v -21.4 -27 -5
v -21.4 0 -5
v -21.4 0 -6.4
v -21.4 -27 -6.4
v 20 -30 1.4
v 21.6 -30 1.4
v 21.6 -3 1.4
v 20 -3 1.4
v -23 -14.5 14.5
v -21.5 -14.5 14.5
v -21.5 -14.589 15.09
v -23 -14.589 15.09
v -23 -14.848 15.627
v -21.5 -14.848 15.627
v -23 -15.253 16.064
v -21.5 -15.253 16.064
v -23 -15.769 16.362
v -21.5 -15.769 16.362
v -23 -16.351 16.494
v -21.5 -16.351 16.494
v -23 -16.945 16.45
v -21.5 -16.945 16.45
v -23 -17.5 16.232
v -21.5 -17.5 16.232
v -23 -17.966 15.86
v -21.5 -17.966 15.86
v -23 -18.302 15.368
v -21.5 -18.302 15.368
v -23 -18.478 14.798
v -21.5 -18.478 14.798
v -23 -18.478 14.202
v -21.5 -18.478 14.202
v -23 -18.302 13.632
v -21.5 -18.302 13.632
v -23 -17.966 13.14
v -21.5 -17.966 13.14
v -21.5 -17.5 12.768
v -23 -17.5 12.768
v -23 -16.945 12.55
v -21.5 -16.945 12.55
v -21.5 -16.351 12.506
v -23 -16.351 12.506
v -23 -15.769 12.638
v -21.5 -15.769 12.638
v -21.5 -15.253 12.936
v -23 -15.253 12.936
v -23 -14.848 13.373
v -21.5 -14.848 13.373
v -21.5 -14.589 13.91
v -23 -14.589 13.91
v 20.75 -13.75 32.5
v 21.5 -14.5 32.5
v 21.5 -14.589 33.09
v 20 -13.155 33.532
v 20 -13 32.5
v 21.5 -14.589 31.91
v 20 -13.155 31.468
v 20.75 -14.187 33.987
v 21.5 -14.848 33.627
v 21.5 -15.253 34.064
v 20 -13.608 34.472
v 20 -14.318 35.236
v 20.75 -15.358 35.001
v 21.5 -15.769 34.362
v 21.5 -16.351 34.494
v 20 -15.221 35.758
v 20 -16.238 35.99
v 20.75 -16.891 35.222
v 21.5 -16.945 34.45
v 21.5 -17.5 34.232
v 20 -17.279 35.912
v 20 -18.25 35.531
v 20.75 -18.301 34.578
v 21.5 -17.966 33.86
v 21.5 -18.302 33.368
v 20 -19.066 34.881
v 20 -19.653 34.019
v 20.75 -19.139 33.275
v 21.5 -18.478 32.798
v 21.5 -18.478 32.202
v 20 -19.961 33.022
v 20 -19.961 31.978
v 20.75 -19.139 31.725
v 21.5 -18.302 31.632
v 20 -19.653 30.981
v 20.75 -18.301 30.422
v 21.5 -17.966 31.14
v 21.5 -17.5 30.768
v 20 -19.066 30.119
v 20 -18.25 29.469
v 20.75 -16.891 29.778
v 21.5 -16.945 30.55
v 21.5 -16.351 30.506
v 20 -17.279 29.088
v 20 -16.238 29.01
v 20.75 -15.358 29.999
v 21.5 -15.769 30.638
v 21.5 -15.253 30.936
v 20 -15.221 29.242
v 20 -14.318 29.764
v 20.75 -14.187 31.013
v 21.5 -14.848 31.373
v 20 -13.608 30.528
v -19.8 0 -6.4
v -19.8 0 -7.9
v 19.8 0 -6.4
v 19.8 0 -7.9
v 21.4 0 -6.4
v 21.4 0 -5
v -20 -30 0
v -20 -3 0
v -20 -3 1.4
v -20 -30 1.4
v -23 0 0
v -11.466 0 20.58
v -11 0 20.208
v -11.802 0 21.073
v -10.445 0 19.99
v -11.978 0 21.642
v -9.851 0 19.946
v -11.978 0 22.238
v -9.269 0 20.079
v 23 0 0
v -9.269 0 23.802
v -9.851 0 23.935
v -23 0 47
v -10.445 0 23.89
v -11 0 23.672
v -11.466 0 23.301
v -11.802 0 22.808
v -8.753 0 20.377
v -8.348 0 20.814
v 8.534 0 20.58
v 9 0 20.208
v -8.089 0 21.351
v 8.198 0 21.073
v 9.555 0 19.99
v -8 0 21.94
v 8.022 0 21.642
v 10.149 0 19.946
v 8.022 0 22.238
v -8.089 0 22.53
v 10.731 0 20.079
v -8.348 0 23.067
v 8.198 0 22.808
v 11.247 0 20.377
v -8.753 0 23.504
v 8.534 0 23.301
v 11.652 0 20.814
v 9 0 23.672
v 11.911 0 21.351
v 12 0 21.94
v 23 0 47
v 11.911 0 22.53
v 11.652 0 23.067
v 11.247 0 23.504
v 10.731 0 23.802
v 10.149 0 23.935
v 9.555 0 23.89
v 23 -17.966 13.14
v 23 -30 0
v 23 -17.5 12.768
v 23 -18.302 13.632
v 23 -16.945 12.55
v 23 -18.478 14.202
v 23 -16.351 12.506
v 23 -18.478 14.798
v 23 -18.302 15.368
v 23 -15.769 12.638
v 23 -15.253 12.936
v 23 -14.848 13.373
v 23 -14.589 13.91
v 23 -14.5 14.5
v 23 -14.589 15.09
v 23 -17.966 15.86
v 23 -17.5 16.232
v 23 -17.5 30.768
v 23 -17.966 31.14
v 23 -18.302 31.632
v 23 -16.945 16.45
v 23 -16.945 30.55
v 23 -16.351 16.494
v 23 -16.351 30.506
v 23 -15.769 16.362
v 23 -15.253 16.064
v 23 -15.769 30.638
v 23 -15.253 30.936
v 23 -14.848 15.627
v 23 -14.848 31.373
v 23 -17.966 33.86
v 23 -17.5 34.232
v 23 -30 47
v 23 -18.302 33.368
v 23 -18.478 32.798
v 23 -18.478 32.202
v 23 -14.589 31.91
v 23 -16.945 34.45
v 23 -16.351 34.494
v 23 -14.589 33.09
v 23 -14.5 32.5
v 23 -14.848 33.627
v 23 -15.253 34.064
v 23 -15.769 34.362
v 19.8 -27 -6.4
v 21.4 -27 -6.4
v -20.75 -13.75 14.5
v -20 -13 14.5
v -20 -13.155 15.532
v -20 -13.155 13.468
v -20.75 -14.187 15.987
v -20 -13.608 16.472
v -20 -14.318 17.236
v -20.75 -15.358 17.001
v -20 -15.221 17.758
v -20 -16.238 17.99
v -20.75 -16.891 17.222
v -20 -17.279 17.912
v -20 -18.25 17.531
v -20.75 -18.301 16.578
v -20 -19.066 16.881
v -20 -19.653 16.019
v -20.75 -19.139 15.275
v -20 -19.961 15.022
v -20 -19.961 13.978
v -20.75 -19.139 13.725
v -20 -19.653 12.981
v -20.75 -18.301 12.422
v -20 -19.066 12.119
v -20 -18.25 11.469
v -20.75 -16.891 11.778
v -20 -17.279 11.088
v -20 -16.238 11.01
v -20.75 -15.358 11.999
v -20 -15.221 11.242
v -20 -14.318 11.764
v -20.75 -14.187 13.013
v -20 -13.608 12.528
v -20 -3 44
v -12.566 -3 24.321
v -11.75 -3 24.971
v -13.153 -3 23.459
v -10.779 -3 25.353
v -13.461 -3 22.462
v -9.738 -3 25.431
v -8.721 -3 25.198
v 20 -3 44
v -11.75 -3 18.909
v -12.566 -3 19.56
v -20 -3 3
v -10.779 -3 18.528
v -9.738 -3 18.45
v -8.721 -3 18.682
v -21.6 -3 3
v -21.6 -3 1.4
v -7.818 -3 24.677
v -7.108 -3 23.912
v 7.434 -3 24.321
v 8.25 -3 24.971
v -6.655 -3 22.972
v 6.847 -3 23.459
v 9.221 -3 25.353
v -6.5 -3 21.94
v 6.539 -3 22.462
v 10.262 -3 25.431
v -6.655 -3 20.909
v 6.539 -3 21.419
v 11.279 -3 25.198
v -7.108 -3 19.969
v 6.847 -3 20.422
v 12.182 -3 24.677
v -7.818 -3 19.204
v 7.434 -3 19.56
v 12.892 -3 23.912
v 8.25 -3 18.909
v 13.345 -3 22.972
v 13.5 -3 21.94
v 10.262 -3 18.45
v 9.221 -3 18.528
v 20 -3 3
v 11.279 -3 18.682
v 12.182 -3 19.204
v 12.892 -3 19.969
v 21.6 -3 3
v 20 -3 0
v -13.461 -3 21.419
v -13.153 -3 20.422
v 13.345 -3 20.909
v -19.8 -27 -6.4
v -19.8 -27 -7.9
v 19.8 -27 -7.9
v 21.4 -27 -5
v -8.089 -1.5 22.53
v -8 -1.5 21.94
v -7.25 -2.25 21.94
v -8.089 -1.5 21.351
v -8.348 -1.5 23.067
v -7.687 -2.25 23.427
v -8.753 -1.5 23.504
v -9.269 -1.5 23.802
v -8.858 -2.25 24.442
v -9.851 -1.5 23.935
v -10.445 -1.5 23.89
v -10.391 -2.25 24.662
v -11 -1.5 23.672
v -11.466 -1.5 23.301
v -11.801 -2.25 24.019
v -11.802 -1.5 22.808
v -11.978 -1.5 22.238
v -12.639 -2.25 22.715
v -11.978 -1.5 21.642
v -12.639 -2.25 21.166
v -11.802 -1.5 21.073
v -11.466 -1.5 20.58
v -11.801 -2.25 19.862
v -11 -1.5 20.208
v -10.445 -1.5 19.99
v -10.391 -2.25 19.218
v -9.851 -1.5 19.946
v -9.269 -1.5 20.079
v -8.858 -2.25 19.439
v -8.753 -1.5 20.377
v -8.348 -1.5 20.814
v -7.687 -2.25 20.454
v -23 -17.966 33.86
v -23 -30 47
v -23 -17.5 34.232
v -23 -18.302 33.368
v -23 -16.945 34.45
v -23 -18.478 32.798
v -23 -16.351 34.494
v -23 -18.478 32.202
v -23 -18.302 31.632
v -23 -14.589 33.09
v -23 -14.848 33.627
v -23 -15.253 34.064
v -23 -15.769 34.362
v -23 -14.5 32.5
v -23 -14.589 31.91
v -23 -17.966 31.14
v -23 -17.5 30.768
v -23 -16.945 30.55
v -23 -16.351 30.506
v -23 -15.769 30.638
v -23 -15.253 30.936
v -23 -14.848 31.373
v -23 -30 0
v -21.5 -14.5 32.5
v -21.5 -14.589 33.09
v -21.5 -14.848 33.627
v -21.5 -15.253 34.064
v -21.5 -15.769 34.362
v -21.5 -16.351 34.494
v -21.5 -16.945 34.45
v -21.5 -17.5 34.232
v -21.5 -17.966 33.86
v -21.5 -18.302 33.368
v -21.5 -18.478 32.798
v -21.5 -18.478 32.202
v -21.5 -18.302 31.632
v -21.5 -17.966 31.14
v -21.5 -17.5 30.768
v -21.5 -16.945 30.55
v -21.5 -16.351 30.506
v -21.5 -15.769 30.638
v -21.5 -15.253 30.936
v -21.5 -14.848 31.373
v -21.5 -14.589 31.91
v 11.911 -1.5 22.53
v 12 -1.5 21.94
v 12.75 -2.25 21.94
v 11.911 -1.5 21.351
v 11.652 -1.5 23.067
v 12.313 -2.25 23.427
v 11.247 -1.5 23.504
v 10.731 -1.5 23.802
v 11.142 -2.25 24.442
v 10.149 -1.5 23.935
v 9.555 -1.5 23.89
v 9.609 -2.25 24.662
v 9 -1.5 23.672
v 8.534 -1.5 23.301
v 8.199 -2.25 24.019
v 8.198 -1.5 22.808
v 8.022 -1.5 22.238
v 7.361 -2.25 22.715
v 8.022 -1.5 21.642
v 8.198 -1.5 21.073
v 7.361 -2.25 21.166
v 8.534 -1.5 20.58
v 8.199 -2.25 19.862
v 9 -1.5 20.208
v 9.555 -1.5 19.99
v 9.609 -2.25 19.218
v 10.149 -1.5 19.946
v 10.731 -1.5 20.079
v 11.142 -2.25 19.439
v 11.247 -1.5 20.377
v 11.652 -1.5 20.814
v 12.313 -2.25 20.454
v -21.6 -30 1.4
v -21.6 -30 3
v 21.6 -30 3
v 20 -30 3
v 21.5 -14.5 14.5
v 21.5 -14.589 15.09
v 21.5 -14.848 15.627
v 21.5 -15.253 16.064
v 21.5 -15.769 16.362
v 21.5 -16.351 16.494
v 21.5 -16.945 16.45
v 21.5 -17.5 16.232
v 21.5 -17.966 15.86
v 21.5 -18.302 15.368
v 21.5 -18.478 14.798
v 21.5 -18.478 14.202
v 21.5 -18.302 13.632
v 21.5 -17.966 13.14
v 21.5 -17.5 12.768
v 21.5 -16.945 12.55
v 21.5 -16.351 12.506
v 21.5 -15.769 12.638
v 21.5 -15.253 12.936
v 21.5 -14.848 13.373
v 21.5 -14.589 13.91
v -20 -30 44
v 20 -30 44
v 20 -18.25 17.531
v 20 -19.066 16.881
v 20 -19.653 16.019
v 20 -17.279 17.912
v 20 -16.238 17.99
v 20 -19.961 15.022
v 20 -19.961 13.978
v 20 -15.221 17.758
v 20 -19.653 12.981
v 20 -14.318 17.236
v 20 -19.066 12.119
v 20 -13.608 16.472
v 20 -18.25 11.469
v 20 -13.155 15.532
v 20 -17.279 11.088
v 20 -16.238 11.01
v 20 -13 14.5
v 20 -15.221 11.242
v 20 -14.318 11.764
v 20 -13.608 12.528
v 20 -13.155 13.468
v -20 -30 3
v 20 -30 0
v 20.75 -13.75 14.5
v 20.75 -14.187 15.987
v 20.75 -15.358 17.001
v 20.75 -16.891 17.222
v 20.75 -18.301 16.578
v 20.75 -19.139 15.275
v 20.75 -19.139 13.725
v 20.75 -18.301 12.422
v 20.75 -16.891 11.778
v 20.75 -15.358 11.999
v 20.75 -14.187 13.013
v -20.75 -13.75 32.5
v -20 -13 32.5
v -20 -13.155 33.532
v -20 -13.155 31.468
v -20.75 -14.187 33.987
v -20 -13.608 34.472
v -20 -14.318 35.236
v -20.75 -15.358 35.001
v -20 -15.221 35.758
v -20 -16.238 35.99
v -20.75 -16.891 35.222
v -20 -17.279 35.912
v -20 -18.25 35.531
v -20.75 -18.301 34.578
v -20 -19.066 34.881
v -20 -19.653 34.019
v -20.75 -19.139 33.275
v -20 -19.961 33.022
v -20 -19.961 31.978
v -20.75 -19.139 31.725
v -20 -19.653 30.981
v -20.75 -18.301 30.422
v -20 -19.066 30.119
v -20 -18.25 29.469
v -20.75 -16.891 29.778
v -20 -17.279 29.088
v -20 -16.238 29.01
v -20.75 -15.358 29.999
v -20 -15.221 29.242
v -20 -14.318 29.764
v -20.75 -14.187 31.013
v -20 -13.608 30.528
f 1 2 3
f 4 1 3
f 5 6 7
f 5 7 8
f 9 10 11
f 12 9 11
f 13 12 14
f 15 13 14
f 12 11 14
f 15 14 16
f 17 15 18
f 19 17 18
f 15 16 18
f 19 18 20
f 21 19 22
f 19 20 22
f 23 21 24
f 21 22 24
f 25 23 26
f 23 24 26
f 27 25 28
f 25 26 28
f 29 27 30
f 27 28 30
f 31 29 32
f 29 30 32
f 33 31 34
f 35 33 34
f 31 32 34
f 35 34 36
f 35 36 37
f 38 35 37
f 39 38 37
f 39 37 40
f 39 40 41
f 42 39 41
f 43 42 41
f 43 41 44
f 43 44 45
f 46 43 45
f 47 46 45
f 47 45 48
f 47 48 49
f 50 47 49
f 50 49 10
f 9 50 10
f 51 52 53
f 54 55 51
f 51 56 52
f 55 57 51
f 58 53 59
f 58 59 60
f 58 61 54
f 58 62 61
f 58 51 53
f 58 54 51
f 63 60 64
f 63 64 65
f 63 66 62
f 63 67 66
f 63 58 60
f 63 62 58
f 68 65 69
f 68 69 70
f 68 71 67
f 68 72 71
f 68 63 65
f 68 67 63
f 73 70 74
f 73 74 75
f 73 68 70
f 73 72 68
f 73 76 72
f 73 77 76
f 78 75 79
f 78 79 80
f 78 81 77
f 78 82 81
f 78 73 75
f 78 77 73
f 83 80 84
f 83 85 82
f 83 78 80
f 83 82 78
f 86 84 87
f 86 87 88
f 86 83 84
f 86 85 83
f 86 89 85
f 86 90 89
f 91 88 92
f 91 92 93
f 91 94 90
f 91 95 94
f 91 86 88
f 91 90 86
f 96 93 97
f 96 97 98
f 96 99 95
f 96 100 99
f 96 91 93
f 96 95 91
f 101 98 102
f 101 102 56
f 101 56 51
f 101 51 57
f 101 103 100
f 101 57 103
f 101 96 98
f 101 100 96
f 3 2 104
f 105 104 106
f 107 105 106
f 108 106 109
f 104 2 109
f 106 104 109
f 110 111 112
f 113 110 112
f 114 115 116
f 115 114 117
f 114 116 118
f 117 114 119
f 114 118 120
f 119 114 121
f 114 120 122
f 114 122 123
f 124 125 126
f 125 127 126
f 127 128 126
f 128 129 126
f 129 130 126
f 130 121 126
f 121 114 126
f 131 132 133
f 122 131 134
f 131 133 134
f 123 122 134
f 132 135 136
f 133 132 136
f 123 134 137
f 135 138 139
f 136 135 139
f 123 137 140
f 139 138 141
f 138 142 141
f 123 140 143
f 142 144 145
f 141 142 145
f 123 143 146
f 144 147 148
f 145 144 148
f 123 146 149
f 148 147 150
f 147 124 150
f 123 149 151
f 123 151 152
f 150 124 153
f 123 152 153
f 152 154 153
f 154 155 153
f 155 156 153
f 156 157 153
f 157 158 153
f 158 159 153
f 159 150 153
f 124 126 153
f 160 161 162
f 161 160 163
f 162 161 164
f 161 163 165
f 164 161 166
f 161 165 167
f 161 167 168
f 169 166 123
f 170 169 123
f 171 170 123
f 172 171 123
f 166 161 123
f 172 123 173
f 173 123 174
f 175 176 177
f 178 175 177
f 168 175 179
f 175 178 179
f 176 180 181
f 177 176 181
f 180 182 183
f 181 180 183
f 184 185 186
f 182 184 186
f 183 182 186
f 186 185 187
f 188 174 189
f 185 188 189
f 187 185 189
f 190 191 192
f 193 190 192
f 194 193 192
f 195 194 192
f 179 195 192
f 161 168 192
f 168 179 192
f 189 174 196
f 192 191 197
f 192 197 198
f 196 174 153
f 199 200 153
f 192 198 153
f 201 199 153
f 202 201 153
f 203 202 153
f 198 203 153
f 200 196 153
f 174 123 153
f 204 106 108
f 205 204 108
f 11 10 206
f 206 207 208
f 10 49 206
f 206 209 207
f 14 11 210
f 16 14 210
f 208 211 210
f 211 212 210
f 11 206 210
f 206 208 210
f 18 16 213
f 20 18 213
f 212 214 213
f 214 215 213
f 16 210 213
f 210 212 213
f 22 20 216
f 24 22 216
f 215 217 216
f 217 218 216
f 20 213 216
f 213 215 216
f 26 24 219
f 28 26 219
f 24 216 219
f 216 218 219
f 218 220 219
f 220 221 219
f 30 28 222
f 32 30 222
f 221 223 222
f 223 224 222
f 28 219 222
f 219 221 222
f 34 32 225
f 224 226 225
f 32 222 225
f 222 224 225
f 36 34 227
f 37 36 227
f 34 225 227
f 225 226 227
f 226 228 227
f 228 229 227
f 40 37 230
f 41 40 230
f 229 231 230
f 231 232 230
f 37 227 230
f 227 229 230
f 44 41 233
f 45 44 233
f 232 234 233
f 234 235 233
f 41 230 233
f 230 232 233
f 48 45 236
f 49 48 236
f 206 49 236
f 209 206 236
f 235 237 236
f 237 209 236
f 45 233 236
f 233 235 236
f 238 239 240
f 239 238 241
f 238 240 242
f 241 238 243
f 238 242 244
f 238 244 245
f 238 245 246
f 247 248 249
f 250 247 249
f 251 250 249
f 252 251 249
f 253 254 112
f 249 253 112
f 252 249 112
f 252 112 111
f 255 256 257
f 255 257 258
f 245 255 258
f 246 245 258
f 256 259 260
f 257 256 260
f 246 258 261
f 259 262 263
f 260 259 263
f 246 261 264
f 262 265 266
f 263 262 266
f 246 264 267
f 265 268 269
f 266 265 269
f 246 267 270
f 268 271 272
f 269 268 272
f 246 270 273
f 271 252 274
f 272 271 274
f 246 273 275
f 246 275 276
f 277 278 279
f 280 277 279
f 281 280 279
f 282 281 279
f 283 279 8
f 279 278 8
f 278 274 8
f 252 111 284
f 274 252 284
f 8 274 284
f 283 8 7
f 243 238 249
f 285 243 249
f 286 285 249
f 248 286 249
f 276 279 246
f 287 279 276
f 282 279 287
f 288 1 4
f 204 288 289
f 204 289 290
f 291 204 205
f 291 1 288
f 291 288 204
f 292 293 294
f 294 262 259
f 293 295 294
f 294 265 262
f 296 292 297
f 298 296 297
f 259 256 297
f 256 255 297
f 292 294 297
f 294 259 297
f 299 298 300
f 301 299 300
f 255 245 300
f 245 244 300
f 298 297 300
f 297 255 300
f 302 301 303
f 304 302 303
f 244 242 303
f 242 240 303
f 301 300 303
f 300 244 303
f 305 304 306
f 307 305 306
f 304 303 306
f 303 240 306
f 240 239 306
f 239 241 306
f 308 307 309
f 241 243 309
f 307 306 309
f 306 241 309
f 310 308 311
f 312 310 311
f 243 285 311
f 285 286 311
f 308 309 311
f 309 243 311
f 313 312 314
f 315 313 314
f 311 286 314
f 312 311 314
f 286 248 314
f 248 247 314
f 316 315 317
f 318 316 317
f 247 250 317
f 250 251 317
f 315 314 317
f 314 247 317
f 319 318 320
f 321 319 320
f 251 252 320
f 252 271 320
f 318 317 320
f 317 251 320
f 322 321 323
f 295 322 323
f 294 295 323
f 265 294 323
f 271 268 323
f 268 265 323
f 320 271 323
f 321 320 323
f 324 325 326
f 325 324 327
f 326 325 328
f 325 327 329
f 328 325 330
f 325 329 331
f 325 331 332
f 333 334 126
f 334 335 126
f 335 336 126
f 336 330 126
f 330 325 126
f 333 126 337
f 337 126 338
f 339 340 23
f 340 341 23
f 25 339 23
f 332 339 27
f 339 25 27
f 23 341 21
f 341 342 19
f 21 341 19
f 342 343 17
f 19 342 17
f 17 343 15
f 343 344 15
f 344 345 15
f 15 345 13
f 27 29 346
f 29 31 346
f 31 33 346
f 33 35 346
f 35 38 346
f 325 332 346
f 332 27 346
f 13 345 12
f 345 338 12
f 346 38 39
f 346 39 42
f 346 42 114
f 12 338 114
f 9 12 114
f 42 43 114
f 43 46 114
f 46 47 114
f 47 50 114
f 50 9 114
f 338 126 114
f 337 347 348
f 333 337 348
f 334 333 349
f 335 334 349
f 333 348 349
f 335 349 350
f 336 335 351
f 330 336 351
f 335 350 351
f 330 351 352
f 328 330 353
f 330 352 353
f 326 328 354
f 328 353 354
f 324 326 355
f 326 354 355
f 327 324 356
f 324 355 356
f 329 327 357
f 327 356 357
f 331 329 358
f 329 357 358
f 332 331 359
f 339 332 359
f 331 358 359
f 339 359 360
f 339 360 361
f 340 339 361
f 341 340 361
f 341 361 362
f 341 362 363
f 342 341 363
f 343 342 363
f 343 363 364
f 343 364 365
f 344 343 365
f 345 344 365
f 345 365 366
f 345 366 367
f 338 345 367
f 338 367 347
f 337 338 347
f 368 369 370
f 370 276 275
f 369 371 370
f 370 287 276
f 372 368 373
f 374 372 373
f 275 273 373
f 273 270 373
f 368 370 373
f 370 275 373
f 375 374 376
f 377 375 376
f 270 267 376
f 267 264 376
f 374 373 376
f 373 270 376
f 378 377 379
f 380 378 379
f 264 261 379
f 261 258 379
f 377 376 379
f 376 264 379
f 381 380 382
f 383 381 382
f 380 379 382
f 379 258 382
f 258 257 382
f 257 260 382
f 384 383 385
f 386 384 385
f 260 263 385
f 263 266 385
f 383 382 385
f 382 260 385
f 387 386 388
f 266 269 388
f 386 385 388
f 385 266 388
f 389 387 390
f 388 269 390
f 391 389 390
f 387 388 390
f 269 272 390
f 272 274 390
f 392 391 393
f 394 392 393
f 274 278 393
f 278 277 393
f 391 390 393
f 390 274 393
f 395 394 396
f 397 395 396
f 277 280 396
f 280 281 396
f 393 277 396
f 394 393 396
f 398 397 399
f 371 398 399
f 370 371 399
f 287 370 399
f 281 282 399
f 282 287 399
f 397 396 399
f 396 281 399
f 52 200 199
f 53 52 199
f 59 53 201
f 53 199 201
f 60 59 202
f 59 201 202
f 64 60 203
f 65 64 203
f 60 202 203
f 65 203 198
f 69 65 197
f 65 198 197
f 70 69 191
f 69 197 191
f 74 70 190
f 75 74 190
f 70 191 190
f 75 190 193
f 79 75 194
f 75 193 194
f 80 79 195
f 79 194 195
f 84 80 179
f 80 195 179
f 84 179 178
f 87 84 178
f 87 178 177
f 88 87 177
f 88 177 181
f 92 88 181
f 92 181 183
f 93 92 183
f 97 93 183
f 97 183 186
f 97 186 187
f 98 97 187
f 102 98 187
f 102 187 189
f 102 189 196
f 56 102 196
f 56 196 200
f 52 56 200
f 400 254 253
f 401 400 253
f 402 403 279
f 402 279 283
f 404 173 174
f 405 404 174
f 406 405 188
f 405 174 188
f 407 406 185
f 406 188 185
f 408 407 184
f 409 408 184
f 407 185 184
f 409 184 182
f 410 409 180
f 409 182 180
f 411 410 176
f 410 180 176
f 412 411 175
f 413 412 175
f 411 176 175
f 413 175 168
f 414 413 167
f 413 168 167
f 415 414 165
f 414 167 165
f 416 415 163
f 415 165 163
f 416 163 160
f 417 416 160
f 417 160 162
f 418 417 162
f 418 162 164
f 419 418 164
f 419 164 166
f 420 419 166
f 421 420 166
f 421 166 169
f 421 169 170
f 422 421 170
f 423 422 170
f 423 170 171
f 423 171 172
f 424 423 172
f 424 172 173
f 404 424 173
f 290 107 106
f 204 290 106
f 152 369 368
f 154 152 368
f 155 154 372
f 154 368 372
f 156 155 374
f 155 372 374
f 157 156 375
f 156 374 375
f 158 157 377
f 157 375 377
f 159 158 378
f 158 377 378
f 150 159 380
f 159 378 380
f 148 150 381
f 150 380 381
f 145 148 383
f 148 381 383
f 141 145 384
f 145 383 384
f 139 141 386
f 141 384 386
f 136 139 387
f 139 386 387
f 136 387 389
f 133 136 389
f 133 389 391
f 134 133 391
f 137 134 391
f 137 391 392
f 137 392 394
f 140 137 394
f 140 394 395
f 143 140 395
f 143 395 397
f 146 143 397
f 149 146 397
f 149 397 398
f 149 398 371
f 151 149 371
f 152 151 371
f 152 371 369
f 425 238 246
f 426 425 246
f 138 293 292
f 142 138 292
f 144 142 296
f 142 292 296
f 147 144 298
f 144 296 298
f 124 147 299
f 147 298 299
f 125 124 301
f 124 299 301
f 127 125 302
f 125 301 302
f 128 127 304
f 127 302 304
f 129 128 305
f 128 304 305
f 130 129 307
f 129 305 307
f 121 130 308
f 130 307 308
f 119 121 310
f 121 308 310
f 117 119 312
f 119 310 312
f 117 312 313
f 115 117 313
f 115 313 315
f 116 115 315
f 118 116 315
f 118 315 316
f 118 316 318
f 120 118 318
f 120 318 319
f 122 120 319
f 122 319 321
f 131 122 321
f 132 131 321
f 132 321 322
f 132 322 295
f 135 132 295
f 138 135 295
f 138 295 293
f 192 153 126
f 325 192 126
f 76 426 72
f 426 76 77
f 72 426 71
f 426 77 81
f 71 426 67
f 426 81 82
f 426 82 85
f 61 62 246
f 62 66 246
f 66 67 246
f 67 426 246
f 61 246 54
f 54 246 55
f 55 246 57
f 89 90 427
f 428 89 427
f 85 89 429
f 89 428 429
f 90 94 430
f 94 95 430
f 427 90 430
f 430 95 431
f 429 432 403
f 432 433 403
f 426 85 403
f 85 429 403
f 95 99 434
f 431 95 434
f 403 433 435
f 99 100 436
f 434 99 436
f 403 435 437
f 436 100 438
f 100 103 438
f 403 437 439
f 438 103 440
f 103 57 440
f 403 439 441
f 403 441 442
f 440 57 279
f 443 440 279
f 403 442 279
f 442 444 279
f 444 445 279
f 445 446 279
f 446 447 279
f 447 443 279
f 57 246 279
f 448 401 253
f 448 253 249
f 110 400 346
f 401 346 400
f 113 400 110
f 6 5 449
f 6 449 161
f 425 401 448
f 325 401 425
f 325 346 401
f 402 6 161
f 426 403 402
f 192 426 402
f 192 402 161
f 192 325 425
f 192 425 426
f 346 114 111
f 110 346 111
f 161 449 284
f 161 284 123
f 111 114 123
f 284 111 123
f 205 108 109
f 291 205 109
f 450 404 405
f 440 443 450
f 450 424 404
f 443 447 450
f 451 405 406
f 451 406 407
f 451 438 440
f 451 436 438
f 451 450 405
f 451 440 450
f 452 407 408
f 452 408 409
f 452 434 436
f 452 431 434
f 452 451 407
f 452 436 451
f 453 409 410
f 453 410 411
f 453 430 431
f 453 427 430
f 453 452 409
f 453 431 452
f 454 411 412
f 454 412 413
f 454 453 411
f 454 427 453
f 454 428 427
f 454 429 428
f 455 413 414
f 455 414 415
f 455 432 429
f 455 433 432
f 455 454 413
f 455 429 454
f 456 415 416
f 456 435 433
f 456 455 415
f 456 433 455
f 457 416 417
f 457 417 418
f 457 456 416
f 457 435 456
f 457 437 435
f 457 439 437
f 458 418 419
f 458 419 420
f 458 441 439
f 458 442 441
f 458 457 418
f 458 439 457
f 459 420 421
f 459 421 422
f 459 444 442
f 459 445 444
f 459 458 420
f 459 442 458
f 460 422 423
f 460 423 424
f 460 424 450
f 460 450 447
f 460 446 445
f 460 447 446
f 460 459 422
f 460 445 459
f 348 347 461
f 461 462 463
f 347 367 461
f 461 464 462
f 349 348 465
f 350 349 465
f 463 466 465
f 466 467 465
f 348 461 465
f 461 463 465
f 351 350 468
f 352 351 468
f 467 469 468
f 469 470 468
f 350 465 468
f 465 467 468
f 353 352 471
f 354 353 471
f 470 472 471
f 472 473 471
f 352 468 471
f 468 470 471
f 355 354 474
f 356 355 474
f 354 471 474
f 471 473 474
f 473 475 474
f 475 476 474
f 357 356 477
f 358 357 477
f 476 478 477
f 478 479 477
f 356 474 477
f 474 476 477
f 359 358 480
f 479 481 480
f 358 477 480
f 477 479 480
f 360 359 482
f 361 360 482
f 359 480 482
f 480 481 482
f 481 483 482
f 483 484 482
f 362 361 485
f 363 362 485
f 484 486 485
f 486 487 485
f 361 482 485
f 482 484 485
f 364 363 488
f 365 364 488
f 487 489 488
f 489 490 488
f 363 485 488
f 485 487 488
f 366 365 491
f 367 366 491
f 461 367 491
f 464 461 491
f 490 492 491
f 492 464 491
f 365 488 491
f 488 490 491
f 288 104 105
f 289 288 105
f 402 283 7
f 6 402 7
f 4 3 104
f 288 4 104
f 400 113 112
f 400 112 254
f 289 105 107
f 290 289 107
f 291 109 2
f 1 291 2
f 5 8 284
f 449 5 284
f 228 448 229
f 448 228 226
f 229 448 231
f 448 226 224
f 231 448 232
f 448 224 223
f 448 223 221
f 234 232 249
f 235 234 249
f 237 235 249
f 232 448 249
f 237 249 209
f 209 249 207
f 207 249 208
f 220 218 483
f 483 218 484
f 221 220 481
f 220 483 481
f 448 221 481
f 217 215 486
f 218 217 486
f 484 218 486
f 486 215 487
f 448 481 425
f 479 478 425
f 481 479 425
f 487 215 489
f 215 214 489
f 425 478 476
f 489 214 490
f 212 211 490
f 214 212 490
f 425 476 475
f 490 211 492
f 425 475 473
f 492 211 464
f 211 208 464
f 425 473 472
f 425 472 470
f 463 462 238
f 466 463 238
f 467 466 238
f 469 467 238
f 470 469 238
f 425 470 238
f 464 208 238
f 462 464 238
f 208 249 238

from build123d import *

# Parameters (mm, degrees)
F1_DEPTH = 30
F2_W     = 46
F2_H     = 3
F3_DEPTH = 47
F4_R     = 2
F5_DEPTH = 3.001
F7_DEPTH = 27
F8_R     = 2
F9_DEPTH = 50
F10_SIZE = 1.5


with BuildPart() as f1:
    # F0 (on Front) → F1 (new body)
    with BuildSketch(Plane.XZ):
        Polygon((-20, 44), (0, 44), (20, 44), (20, 3), (21.6, 3), (21.6, 1.4), (20, 1.4), (20, 0), (23, 0), (23, 47), (0, 47), (-23, 47), (-23, 0), (-20, 0), (-20, 1.4), (-21.6, 1.4), (-21.6, 3), (-20, 3), align=None)
    extrude(amount=F1_DEPTH)

    # F2 (on Top) → F3 (join)
    with BuildSketch(Plane.XY):
        with Locations((0, -1.5)):
            Rectangle(F2_W, F2_H)
    extrude(amount=F3_DEPTH)

    # F4 (on face) → F5 (cut, through all)
    with BuildSketch(Plane.XZ.offset(3)):
        with Locations((-10, 21.9403412193)):
            Circle(F4_R)
        with Locations((10, 21.9403412193)):
            Circle(F4_R)
    extrude(amount=-F5_DEPTH, mode=Mode.SUBTRACT)

    # F8 (on face) → F9 (cut)
    with BuildSketch(Plane.YZ.offset(23)):
        with Locations((-16.5, 32.5)):
            Circle(F8_R)
        with Locations((-16.5, 14.5)):
            Circle(F8_R)
    extrude(amount=-F9_DEPTH, mode=Mode.SUBTRACT)

    # F10
    f10_edges = [f1.edges().sort_by_distance(p)[0] for p in [
        (20, -18.5, 32.5),
        (20, -18.5, 14.5),
        (-20, -18.5, 32.5),
        (-20, -18.5, 14.5),
        (-12, -3, 21.940341),
        (8, -3, 21.940341),
    ]]
    chamfer(f10_edges, length=F10_SIZE)


with BuildPart() as f7:
    # F6 (on Front) → F7 (new body)
    with BuildSketch(Plane.XZ):
        Polygon((21.4, -5), (0, -5), (-21.4, -5), (-21.4, -6.4), (-19.8, -6.4), (-19.8, -7.9), (0, -7.9), (19.8, -7.9), (19.8, -6.4), (21.4, -6.4), align=None)
    extrude(amount=F7_DEPTH)


solid = Compound([f1.part, f7.part])
